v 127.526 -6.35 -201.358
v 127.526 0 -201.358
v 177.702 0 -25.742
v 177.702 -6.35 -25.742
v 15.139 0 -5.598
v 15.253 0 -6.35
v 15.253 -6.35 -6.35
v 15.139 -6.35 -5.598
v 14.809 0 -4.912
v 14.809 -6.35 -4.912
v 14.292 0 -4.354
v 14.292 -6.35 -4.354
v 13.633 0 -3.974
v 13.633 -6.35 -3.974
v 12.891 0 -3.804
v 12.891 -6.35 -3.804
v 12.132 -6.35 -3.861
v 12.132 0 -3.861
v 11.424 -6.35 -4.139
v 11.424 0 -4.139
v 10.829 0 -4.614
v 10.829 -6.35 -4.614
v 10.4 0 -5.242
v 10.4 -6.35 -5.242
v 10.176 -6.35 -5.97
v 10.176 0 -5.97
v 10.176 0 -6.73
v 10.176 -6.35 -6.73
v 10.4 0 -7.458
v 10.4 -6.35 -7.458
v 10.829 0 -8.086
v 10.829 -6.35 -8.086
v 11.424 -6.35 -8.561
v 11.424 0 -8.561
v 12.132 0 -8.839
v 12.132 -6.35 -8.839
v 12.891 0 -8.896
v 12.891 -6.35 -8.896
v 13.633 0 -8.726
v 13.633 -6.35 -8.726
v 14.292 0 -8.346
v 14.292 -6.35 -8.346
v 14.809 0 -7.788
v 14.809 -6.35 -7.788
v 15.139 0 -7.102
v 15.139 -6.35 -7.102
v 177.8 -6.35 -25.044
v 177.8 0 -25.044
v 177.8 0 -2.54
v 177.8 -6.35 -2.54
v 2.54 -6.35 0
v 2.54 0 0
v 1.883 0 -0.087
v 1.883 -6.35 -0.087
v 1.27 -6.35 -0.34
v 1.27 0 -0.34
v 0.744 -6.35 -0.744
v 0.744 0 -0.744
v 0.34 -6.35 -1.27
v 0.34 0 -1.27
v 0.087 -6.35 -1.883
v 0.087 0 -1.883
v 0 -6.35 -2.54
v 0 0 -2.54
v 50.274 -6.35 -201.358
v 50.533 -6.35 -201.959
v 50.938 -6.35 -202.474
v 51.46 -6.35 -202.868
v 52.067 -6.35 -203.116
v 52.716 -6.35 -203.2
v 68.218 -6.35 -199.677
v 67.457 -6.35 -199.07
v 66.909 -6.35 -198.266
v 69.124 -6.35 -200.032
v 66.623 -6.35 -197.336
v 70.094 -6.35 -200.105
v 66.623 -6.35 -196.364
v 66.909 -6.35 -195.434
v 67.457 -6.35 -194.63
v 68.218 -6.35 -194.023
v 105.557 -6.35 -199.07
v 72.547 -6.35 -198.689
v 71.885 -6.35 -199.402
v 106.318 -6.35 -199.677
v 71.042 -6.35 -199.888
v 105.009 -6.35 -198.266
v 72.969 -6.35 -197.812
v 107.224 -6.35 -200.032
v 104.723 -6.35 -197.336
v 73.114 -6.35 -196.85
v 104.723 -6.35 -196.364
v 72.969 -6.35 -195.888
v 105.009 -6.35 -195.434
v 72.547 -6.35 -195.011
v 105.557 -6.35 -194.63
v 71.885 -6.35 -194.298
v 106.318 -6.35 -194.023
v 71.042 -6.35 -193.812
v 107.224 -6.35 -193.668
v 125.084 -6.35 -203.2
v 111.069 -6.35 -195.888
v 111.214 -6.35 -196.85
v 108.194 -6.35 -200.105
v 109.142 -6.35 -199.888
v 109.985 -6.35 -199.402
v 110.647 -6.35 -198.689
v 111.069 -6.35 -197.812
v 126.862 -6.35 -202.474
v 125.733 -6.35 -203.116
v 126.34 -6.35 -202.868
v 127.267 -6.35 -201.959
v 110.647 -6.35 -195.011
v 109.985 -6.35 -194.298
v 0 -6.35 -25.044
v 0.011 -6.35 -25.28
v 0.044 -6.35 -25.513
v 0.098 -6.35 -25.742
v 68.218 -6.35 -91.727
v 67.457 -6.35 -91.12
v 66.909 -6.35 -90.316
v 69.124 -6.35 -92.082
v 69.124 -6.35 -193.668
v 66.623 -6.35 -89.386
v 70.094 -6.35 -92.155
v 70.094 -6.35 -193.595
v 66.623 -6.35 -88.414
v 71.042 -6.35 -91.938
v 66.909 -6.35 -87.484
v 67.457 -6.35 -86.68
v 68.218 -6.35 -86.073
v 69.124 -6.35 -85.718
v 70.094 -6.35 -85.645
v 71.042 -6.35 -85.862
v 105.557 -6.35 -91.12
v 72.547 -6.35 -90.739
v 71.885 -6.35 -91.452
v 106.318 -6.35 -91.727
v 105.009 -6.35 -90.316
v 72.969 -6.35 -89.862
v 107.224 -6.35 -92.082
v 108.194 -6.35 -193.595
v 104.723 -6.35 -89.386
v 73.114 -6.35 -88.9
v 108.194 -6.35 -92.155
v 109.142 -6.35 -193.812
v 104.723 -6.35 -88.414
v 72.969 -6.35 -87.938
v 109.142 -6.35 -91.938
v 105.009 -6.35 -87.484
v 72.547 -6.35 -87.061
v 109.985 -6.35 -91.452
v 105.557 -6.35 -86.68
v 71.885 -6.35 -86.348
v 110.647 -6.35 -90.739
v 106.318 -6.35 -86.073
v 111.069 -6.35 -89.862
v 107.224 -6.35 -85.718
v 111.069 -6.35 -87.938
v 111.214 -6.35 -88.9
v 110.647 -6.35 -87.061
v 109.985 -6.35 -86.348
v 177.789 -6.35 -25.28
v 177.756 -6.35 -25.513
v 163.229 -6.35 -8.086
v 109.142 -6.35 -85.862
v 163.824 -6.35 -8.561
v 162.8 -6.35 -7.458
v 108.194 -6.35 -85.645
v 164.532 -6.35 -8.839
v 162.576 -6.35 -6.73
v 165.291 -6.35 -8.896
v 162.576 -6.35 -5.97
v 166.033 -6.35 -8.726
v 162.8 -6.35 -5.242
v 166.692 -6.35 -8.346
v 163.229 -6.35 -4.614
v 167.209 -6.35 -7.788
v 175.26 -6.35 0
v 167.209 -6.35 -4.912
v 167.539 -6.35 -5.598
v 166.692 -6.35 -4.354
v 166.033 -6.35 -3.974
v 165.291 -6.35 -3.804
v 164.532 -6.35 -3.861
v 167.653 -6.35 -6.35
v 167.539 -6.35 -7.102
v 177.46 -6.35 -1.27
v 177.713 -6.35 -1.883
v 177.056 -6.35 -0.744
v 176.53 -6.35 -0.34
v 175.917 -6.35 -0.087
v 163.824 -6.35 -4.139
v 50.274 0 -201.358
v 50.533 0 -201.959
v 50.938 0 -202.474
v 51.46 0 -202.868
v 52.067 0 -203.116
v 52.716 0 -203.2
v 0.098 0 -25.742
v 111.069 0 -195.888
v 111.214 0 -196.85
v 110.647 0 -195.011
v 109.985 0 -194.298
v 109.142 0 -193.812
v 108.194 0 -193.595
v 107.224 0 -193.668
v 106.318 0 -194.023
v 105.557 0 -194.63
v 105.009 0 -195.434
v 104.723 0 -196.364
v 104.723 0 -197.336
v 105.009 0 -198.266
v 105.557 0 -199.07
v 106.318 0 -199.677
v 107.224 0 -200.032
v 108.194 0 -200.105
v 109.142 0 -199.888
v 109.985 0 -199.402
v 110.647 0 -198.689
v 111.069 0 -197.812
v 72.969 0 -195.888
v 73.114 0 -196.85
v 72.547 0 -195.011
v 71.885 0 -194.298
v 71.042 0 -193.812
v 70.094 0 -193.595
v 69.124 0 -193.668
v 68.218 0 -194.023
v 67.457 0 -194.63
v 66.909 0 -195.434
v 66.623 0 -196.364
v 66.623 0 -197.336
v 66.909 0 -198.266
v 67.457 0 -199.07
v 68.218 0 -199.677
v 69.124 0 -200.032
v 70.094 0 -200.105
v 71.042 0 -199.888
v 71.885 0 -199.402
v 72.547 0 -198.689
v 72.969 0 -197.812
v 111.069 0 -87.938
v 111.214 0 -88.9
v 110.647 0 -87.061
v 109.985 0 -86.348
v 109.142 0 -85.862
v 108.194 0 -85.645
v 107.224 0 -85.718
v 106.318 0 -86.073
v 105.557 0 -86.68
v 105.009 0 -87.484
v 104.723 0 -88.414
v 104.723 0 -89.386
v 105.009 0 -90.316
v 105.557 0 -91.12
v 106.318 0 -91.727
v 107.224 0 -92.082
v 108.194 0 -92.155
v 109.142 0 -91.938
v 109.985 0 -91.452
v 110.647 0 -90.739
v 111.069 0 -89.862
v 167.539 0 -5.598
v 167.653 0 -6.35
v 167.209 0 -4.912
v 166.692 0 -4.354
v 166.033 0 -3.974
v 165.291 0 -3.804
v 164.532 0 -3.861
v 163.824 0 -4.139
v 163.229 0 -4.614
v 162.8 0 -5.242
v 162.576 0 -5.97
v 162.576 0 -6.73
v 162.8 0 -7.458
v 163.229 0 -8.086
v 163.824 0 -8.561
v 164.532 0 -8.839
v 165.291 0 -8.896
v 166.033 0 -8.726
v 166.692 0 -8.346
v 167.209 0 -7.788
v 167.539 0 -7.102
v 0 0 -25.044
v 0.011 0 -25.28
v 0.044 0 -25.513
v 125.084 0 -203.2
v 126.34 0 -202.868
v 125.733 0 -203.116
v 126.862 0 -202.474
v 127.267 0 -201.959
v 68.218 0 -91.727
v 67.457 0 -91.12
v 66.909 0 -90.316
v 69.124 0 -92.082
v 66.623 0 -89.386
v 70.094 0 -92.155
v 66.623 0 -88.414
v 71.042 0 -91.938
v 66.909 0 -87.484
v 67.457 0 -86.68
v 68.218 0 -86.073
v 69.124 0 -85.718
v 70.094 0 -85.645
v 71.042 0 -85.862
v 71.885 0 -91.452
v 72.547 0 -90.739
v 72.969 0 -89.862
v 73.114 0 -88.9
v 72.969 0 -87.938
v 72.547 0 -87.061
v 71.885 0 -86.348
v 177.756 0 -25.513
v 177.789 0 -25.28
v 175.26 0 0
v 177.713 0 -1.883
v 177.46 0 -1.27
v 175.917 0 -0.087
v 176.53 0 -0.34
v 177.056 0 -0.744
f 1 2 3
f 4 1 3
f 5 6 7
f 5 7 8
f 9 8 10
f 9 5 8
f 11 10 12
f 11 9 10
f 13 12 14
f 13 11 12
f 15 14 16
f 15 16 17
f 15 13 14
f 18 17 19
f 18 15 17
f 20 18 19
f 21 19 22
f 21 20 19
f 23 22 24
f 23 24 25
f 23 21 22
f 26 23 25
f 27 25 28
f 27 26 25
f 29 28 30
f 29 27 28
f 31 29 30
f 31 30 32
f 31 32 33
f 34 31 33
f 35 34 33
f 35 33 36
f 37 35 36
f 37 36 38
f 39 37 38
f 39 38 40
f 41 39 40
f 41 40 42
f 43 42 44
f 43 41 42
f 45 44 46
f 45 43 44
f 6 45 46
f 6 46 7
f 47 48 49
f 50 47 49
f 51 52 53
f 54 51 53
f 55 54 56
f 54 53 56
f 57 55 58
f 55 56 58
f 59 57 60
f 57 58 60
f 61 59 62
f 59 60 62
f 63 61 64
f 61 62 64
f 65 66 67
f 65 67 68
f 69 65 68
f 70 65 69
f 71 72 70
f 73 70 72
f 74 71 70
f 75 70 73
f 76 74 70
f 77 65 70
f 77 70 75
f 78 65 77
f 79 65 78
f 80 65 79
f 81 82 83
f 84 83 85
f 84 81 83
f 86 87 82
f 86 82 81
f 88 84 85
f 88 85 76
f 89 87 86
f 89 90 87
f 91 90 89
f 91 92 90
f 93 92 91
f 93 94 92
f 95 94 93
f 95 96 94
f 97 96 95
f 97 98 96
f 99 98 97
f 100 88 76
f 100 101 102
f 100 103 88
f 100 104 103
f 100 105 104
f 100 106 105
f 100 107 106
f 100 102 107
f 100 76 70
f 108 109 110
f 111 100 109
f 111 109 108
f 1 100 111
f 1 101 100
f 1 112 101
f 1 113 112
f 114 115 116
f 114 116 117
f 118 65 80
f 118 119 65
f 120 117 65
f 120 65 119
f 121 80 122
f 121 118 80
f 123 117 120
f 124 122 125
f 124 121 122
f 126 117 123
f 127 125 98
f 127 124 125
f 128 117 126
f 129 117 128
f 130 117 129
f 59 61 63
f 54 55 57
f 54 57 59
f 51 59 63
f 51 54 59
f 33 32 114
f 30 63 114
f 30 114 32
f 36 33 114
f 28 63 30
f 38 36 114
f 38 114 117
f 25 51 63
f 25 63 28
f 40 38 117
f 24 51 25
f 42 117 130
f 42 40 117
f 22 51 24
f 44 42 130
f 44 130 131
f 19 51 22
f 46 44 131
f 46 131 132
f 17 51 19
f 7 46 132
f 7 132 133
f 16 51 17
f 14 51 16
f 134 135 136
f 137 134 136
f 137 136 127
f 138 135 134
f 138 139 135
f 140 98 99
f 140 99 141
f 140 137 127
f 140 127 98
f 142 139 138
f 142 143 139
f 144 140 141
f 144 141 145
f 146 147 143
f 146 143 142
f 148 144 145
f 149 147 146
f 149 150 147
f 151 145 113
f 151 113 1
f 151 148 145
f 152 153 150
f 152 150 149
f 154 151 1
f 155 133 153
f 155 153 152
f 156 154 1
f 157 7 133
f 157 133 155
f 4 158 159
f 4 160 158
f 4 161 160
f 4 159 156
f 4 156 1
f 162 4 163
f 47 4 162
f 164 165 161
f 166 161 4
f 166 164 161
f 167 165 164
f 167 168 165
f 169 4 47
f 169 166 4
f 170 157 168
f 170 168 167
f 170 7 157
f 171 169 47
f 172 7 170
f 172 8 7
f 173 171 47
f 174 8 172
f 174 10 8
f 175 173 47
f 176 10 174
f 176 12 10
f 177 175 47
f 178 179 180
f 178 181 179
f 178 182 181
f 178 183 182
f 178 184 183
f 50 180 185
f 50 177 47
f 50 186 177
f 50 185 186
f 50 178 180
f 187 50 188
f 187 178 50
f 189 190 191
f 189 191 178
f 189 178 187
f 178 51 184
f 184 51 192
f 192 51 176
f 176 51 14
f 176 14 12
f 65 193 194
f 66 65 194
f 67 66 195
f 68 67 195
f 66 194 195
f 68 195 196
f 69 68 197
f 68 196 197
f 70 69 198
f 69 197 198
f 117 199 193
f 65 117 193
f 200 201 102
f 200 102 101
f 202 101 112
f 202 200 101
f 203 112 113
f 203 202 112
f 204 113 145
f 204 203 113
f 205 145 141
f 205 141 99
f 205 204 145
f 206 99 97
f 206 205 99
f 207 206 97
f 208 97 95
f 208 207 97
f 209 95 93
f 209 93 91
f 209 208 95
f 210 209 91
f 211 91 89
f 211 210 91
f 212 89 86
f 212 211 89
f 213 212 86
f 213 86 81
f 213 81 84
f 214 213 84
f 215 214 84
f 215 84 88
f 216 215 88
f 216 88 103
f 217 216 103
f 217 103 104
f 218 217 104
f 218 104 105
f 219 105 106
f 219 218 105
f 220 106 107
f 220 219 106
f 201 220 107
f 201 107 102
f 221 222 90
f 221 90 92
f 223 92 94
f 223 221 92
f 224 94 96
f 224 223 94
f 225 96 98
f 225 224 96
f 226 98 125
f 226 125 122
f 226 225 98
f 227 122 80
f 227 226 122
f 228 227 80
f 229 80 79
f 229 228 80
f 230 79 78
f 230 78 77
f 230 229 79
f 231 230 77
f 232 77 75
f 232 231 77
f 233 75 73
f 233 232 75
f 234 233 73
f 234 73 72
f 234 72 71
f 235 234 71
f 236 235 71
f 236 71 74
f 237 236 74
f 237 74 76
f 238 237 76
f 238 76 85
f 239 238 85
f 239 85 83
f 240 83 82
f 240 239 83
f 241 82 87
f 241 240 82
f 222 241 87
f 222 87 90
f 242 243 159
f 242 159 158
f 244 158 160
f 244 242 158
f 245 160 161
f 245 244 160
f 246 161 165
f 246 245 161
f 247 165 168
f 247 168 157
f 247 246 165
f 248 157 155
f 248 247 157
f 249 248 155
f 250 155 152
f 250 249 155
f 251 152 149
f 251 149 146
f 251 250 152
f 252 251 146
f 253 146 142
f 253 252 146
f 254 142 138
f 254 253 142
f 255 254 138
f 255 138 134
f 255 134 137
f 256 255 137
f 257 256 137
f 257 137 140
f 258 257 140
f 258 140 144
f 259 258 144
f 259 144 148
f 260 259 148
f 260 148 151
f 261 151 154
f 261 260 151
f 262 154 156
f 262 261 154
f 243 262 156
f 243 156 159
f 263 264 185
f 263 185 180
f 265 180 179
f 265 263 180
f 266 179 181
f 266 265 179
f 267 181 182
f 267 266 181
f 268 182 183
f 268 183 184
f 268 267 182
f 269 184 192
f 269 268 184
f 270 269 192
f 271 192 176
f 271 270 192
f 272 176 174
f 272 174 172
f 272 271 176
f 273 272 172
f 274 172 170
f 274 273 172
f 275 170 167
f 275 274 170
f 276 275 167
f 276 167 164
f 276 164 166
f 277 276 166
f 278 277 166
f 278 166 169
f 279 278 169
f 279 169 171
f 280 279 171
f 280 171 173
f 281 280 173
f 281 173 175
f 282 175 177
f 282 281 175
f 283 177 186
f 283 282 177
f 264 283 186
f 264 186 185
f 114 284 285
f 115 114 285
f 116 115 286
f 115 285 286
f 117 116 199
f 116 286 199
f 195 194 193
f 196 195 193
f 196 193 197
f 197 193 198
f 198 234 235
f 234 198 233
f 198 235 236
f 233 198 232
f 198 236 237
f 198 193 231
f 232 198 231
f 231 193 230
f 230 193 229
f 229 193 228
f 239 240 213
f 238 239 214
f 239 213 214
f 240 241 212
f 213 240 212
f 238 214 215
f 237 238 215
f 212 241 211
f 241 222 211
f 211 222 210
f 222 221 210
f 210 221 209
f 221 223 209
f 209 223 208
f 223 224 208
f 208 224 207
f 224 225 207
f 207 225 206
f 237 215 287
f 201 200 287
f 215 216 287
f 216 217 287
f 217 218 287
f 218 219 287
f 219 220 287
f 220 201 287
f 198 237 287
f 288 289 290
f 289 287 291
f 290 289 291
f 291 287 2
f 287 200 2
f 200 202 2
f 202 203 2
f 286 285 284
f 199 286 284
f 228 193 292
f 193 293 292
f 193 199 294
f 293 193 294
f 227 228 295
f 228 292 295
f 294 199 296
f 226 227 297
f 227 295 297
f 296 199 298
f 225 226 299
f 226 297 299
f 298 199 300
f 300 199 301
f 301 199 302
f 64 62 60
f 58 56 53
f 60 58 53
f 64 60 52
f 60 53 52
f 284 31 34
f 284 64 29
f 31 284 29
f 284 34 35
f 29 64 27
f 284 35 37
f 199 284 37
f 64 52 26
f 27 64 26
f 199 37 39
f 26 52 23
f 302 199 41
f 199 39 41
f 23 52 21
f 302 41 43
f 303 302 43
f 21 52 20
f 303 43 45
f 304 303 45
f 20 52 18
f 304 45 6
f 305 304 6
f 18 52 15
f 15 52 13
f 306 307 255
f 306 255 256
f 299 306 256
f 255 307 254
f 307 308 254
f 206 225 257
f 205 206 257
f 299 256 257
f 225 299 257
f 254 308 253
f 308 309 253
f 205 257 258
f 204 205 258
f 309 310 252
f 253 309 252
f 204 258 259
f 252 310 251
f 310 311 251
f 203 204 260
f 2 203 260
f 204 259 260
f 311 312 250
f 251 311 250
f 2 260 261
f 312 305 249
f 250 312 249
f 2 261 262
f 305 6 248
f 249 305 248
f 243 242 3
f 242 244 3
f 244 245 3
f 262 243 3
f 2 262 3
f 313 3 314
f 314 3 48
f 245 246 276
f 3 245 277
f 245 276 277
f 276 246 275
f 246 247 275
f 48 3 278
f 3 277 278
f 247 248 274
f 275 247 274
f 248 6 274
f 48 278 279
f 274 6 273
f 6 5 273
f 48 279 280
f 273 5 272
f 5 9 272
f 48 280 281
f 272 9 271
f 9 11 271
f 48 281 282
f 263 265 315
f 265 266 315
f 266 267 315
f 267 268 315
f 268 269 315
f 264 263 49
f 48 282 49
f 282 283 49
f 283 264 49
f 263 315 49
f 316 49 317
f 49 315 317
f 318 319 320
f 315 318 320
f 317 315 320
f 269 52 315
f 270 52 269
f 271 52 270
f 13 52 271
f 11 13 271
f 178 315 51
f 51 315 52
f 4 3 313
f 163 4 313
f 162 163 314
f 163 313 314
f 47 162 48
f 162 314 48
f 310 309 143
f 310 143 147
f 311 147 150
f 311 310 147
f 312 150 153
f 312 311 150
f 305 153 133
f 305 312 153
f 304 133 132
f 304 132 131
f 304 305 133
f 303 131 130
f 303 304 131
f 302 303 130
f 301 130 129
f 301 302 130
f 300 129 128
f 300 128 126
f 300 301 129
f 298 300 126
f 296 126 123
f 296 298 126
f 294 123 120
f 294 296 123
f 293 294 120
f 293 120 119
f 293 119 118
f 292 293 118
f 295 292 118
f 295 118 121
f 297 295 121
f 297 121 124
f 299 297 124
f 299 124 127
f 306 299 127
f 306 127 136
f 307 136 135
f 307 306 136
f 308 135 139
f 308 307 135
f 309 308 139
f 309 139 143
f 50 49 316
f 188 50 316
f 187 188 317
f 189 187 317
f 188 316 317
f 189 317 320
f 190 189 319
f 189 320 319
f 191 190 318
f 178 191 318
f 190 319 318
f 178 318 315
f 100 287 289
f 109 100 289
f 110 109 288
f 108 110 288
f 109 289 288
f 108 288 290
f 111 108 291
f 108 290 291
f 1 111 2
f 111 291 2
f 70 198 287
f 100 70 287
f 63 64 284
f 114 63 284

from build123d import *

# Parameters (mm, degrees)
F0_R     = 3.2639
F0_R_2   = 2.5527
F1_DEPTH = 6.35


with BuildPart() as f1:
    # F0 (on Front) → F1 (new body)
    with BuildSketch(Plane.XZ):
        with BuildLine():
            Line((175.26, 0), (2.54, 0))
            ThreePointArc((2.54, 0), (0.743949, -0.743949), (0, -2.54))
            Line((0, -2.54), (0, -25.04426))
            ThreePointArc((0, -25.04426), (0.024551, -25.396562), (0.097729, -25.742052))
            Line((0.097729, -25.742052), (50.273655, -201.357792))
            ThreePointArc((50.273655, -201.357792), (51.186349, -202.687806), (52.715926, -203.2))
            Line((52.715926, -203.2), (125.084074, -203.2))
            ThreePointArc((125.084074, -203.2), (126.613651, -202.687806), (127.526345, -201.357792))
            Line((127.526345, -201.357792), (177.702271, -25.742052))
            ThreePointArc((177.702271, -25.742052), (177.775449, -25.396562), (177.8, -25.04426))
            Line((177.8, -25.04426), (177.8, -2.54))
            ThreePointArc((177.8, -2.54), (177.056051, -0.743949), (175.26, 0))
        make_face()
        with Locations((69.85, -196.85)):
            Circle(F0_R, mode=Mode.SUBTRACT)
        with Locations((107.95, -196.85)):
            Circle(F0_R, mode=Mode.SUBTRACT)
        with Locations((69.85, -88.9)):
            Circle(F0_R, mode=Mode.SUBTRACT)
        with Locations((12.7, -6.35)):
            Circle(F0_R_2, mode=Mode.SUBTRACT)
        with Locations((107.95, -88.9)):
            Circle(F0_R, mode=Mode.SUBTRACT)
        with Locations((165.1, -6.35)):
            Circle(F0_R_2, mode=Mode.SUBTRACT)
    extrude(amount=F1_DEPTH)


solid = f1.part
